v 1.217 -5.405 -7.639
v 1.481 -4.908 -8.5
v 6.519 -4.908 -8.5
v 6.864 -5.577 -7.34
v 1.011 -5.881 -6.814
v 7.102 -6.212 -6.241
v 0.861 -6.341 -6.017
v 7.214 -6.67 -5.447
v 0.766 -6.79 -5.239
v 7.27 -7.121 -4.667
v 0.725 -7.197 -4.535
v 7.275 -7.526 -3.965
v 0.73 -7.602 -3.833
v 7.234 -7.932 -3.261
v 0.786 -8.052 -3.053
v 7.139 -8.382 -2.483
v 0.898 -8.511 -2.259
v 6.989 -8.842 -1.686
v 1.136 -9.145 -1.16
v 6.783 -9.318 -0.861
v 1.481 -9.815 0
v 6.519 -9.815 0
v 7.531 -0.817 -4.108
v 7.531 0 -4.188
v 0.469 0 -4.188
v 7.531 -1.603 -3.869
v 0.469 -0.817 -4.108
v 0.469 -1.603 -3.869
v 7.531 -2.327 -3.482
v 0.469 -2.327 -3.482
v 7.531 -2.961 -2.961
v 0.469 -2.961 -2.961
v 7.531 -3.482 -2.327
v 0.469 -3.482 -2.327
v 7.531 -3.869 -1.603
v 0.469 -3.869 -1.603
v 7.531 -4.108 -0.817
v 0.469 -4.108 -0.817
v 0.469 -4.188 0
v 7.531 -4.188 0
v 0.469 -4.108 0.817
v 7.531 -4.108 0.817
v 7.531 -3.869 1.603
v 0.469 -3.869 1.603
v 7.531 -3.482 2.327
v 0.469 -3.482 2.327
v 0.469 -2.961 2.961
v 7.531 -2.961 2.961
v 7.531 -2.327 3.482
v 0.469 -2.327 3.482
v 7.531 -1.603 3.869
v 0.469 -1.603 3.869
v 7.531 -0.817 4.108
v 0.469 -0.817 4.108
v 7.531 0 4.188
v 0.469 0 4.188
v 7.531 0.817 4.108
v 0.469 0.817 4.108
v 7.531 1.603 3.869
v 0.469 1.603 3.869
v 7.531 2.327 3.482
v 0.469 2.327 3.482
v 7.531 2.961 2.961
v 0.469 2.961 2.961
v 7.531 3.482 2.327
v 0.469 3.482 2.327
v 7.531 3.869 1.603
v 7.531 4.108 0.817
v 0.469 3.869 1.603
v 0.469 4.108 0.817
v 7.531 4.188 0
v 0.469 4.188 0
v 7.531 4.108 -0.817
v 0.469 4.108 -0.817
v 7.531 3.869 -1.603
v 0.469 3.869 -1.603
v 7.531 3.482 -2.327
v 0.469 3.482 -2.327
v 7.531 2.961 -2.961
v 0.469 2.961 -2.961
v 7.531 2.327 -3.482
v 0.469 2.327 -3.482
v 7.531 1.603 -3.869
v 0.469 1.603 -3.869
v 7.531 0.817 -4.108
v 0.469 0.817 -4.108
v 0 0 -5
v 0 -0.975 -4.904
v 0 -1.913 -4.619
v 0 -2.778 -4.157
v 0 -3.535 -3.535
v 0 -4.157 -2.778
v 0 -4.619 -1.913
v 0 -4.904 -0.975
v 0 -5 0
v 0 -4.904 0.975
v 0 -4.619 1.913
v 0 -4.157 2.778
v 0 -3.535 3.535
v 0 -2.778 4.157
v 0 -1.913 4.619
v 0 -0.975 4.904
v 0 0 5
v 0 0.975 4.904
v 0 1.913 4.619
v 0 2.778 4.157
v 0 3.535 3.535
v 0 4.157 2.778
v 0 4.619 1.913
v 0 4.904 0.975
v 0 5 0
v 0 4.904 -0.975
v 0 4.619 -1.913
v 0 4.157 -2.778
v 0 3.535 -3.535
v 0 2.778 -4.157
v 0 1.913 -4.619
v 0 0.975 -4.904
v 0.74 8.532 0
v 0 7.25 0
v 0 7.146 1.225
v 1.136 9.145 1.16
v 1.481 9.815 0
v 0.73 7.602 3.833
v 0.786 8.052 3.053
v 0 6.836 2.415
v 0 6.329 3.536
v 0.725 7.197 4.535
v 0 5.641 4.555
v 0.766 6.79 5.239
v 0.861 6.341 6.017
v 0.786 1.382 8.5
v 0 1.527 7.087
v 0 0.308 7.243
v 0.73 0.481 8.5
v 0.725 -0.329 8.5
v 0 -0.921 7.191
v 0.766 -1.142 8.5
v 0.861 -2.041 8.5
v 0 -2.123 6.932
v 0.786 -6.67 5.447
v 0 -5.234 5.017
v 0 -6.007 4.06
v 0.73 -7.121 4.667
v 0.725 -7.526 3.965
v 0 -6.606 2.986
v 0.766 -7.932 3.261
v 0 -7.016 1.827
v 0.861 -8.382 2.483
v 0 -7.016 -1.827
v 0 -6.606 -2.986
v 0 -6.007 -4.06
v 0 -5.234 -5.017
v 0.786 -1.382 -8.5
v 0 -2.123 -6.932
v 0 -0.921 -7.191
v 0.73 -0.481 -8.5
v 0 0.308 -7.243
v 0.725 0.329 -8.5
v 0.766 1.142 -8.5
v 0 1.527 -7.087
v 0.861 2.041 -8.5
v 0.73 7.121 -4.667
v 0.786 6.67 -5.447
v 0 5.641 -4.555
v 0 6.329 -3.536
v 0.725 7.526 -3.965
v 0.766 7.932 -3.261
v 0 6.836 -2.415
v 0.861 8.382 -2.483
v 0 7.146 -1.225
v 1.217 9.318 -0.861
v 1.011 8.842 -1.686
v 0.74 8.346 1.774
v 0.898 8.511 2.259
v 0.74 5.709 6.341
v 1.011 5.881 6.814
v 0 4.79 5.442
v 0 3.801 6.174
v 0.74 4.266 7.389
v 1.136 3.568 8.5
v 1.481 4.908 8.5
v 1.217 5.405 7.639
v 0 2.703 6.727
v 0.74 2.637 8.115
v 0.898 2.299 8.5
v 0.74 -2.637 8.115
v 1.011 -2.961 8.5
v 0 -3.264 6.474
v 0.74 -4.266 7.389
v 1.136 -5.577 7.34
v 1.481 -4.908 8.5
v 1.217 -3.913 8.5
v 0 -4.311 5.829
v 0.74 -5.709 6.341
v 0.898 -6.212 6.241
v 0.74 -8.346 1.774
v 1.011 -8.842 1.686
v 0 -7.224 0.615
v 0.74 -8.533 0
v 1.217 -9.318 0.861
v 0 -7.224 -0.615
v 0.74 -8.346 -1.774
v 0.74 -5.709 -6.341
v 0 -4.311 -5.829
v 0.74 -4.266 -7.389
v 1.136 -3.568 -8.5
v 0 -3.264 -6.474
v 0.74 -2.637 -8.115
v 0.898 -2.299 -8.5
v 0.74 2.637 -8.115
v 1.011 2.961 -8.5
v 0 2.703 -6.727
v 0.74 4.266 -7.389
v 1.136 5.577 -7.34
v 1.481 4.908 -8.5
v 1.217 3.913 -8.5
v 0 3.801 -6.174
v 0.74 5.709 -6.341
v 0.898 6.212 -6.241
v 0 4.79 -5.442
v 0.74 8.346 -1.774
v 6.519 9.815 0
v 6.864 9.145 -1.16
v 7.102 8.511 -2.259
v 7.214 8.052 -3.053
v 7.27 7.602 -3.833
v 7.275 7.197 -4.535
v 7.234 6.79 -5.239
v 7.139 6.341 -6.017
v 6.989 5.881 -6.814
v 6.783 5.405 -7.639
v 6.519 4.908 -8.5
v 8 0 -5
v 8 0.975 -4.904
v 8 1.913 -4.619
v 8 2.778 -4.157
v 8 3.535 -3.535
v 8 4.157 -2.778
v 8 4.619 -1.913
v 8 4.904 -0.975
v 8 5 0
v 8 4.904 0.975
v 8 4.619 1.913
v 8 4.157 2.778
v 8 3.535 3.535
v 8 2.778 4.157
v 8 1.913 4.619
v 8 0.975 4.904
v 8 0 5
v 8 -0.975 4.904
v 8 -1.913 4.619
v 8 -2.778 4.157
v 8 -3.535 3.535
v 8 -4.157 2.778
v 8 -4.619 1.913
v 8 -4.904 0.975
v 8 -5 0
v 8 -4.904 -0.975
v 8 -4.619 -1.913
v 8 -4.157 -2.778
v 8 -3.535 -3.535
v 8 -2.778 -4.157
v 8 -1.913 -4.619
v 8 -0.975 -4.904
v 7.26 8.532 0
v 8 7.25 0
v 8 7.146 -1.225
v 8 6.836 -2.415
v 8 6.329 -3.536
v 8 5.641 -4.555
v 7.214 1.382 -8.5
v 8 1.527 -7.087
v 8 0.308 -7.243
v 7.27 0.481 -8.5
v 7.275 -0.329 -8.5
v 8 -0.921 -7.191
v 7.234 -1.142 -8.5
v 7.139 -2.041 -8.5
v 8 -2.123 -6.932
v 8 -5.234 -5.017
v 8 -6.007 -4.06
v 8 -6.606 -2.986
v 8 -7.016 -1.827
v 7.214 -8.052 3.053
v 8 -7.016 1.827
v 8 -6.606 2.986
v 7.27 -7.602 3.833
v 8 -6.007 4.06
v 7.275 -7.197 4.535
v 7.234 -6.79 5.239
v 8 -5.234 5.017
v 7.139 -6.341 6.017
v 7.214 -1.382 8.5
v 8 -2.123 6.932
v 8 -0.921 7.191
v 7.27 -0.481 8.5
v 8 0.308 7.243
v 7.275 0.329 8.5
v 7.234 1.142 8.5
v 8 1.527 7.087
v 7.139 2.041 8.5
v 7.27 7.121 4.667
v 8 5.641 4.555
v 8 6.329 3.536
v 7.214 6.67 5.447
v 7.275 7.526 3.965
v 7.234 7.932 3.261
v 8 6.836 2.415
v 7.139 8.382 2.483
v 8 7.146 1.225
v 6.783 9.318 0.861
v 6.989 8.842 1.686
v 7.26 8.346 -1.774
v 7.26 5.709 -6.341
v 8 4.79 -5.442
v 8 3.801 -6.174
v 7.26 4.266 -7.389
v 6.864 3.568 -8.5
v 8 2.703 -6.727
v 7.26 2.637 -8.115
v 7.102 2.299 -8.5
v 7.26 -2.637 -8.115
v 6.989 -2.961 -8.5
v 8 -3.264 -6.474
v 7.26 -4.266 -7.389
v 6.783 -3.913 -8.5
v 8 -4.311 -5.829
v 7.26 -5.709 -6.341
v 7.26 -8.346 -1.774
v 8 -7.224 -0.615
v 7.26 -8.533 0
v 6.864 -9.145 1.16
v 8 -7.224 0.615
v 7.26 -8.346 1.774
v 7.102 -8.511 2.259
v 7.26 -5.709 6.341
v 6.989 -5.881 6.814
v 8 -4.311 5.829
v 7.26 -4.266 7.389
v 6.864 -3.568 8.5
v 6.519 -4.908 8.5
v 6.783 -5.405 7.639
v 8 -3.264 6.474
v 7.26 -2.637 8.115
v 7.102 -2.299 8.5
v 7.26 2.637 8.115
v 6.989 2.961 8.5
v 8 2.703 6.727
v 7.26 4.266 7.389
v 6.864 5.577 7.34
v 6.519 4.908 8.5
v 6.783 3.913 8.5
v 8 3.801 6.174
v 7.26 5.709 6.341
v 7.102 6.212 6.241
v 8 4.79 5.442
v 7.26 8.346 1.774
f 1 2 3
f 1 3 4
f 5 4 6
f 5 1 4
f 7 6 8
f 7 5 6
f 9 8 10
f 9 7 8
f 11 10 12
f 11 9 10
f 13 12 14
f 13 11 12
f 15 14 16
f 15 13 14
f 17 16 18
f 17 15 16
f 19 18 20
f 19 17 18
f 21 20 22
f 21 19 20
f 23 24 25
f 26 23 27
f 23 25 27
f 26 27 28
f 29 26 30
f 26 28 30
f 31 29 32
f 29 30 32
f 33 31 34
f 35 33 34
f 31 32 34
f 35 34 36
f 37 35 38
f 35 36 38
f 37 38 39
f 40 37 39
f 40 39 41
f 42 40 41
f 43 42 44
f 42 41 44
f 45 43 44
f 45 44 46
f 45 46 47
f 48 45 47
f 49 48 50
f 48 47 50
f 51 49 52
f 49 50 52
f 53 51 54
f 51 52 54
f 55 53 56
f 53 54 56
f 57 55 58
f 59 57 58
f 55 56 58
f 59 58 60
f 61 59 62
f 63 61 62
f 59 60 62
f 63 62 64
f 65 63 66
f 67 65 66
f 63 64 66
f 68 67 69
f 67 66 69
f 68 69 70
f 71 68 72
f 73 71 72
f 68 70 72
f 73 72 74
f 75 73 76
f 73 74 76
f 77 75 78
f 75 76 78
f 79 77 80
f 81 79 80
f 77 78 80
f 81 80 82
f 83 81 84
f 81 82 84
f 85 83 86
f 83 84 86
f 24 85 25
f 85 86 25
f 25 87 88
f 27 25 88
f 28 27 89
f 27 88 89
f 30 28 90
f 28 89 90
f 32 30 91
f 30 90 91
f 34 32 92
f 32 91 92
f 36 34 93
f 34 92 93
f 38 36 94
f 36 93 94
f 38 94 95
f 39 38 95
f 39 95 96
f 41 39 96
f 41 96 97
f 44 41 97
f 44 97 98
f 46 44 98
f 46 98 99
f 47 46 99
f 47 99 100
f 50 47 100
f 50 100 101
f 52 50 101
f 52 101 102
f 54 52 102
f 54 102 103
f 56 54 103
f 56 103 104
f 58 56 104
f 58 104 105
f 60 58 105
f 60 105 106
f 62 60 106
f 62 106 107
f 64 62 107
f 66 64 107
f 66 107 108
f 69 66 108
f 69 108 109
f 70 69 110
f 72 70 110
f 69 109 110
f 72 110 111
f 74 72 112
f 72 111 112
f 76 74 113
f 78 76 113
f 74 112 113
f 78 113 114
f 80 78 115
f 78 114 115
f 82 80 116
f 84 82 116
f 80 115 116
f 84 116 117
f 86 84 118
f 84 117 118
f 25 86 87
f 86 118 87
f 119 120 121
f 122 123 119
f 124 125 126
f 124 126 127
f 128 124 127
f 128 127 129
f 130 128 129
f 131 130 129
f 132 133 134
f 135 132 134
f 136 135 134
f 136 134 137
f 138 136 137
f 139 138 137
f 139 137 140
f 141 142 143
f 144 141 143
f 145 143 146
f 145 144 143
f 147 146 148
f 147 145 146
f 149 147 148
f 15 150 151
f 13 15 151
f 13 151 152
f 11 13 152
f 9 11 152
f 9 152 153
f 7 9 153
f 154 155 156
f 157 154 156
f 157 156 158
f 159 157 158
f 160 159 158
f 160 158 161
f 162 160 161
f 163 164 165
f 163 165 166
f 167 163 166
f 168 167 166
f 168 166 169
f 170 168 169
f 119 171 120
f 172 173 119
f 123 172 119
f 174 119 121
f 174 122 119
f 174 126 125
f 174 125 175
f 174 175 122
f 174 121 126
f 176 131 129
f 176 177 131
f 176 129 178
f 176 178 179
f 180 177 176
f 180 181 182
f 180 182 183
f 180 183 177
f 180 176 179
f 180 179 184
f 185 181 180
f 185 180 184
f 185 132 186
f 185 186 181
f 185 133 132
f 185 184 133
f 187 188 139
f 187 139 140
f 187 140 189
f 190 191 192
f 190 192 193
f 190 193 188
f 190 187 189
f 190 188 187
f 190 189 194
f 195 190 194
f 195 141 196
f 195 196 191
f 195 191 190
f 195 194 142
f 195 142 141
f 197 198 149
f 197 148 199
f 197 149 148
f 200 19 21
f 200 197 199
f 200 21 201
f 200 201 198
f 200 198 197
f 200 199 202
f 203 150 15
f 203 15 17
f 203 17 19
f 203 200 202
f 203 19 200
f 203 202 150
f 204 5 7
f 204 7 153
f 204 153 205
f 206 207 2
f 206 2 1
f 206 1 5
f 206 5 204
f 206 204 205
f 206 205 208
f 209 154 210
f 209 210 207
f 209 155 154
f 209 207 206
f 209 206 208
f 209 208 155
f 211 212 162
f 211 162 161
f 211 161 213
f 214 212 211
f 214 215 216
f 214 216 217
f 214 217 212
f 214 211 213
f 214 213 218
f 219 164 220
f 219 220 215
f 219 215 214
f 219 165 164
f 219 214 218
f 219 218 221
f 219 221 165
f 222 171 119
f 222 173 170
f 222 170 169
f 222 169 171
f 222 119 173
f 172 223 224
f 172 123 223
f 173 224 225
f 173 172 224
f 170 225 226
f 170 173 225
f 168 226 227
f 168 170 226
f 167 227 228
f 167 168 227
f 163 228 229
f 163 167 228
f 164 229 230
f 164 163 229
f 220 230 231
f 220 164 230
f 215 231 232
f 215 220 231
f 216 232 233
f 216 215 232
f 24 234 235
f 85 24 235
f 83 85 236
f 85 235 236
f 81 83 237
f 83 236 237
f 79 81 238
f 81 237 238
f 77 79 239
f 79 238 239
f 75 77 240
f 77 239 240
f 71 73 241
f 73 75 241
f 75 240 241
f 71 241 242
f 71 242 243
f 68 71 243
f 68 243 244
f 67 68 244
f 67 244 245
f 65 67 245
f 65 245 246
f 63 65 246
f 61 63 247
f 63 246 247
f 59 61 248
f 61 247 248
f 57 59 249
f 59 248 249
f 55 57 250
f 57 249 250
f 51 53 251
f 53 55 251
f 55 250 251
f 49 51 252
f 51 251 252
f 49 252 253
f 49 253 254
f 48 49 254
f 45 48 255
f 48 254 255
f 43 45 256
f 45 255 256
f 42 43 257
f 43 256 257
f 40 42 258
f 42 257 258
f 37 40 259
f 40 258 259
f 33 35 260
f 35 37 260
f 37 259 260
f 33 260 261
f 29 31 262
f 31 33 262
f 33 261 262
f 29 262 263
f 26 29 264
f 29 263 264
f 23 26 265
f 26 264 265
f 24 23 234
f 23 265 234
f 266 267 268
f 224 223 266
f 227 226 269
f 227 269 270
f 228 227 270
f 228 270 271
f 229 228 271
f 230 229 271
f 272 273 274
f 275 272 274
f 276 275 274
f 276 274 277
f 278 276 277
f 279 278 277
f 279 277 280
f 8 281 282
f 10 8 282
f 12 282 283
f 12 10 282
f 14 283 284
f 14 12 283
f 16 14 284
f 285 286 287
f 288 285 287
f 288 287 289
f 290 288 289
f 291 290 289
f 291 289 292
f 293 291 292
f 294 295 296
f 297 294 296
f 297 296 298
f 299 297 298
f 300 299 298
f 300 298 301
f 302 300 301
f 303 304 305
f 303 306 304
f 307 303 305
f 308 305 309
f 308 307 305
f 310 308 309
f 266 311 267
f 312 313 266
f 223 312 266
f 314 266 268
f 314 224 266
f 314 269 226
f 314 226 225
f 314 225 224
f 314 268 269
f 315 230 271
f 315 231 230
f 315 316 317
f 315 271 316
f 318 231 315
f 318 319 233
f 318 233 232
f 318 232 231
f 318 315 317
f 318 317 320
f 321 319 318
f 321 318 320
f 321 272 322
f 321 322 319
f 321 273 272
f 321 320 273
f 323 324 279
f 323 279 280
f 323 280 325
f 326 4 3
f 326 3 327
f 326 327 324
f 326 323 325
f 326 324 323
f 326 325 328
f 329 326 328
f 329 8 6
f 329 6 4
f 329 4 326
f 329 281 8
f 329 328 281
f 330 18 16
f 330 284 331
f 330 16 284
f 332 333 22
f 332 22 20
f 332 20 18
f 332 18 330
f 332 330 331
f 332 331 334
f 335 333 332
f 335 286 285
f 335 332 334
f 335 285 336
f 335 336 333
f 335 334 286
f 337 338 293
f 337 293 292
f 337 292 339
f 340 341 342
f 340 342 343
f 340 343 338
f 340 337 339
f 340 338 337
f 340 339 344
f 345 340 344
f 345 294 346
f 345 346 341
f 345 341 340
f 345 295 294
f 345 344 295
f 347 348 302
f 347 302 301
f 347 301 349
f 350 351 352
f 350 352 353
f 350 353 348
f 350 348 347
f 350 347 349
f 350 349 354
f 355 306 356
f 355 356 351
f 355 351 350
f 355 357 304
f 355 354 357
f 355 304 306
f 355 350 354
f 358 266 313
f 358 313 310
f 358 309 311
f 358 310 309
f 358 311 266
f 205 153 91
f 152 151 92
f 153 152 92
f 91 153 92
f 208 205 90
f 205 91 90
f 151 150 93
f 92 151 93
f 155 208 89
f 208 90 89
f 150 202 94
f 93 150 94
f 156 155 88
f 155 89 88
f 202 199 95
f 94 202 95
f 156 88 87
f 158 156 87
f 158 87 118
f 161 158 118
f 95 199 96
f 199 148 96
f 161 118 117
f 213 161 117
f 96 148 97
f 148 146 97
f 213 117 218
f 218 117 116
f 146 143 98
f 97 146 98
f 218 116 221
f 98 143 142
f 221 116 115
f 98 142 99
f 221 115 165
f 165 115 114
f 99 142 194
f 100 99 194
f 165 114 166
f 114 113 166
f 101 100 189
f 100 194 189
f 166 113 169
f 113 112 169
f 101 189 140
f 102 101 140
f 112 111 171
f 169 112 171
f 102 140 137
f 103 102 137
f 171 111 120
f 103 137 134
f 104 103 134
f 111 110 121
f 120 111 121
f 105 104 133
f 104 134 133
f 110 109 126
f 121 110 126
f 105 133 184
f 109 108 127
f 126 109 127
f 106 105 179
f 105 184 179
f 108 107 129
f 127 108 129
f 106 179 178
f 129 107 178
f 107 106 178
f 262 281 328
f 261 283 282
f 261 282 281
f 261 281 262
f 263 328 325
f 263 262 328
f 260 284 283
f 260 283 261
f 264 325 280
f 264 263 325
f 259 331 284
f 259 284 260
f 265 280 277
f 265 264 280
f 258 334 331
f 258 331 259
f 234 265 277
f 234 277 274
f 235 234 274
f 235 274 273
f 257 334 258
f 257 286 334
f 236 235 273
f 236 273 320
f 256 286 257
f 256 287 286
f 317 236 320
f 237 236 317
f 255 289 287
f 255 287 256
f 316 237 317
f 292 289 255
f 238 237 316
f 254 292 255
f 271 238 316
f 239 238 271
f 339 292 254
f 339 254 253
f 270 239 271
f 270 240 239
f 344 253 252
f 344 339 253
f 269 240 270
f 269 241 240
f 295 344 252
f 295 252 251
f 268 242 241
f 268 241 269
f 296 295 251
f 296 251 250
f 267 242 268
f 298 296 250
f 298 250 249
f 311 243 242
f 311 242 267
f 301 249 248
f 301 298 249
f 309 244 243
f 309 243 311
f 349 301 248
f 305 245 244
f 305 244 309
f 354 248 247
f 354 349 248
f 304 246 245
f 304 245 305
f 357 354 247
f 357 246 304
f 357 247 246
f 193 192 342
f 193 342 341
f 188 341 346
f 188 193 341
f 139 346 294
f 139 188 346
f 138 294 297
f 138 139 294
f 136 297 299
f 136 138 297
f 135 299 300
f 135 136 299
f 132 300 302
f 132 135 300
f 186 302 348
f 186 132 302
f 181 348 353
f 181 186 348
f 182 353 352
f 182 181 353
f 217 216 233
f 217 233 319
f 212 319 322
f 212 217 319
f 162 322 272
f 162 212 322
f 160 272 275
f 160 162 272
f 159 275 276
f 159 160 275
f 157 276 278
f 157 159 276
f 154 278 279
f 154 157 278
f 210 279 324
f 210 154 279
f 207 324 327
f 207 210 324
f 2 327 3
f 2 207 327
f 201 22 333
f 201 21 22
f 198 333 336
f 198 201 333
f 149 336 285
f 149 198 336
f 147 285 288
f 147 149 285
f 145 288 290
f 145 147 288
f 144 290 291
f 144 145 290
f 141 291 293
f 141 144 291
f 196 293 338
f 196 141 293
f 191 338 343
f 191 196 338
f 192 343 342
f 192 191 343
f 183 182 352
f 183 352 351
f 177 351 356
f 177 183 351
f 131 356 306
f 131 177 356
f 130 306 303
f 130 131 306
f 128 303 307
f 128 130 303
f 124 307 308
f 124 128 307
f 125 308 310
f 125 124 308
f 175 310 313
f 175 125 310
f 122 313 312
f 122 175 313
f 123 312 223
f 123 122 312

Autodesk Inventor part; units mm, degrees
ref_plane "YZ Plane" through (0, 0, 0) normal (1, 0, 0) x (0, 1, 0)
ref_plane "XZ Plane" through (0, 0, 0) normal (0, 1, 0) x (-1, 0, 0)
sketch "Sketch1" plane through (0, 0, 0) normal (1, 0, 0) x (0, 1, 0)
  line L0 (-9.815, 0) -> (-4.9075, 8.5)
  line L1 (-4.9075, 8.5) -> (4.9075, 8.5)
  line L2 (4.9075, 8.5) -> (9.815, 0)
  line L3 (9.815, 0) -> (4.9075, -8.5)
  line L4 (4.9075, -8.5) -> (-4.9075, -8.5)
  line L5 (-4.9075, -8.5) -> (-9.815, 0)
  point P0 (0, 0)
  point P1 (0, 0)
  dimension "d0" = 19.6299
extrude "Body" add sketch "Sketch1" along normal blind 8
sketch "Sketch2" plane through (0, 0, 0) normal (0, 0, 1) x (1, 0, 0)
  line L0 (0, 4.9075) -> (0, 9.815) projected
  line L1 (0, 9.815) -> (8, 9.815) projected
  line L2 (8, 4.9075) -> (8, 9.815) projected
  line L3 (-1.6, 0) -> (9.6, 0) projected
  line L4 (1.4809, 9.815) -> (0, 7.25)
  line L5 (6.5191, 9.815) -> (8, 7.25)
  dimension "d3" = 30
  dimension "d4" = 30
  dimension "d5" = 14.5
  dimension "d6" = 14.5
revolve "Chamfer1" cut sketch "Sketch2" angle 360 about axis through (-10, 0, 0) along (1, 0, 0)
sketch "Sketch3" plane through (8, 0, 0) normal (1, 0, 0) x (0, 0, -1)
  arc A0 (-0.625, -1.0825) -> (0.625, -1.0825) centre (0, 0) ccw projected
hole "Thread" at (8, 0, 0) direction (-1, 0, 0) diameter 8.376 end through all thread size "M10x1.5" class "6H" standard "ISO Metric profile"
chamfer "Chamfer2" distance 0.8119 angle 30 1 edges at (8, 0, 4.188) measured on face at (8, 6.1489, -0.7466)
chamfer "Chamfer3" distance 0.8119 angle 30 1 edges at (0, 0, 4.188) measured on face at (0, 6.1489, -0.7466)
ref_plane "Work Plane1" through (-19.1723, 0, 0) normal (0, -0.866, -0.5) x (1, 0, 0)
equation "\"d0\" = 1.1547 * SW"
equation "\"d1\" = KOH"
equation "\"d3\" = ANG1"
equation "\"d4\" = ANG2"
equation "\"d5\" = SW0"
equation "\"d6\" = SW01"
equation "\"d8\" = -0.5 * GD1 + 0.5 * NND"
equation "\"d40\" = -0.5 * GD1 + 0.5 * NND"
equation "\"d10\" = -0.5 * GD1 + 0.5 * NND"
equation "\"d41\" = -0.5 * GD1 + 0.5 * NND"
equation "\"ANG1\" = 30deg"
equation "\"ANG2\" = 30deg"
equation "\"KOH\" = 8"
equation "\"SW\" = 17"
equation "\"SW0\" = 14.5"
equation "\"SW01\" = 14.5"
equation "\"GUL\" = 0.541266 * PTC"
equation "\"TOA\" = 30deg"
equation "\"PTC\" = 1.5"
equation "\"E0\" = 1.155 * SW"
equation "\"GAL\" = 0.541266 * PTC"
equation "\"GD1\" = 8.376202"
equation "\"NND\" = 10"
properties part number "DIN 555-5 - M10" material "Steel, Mild"
